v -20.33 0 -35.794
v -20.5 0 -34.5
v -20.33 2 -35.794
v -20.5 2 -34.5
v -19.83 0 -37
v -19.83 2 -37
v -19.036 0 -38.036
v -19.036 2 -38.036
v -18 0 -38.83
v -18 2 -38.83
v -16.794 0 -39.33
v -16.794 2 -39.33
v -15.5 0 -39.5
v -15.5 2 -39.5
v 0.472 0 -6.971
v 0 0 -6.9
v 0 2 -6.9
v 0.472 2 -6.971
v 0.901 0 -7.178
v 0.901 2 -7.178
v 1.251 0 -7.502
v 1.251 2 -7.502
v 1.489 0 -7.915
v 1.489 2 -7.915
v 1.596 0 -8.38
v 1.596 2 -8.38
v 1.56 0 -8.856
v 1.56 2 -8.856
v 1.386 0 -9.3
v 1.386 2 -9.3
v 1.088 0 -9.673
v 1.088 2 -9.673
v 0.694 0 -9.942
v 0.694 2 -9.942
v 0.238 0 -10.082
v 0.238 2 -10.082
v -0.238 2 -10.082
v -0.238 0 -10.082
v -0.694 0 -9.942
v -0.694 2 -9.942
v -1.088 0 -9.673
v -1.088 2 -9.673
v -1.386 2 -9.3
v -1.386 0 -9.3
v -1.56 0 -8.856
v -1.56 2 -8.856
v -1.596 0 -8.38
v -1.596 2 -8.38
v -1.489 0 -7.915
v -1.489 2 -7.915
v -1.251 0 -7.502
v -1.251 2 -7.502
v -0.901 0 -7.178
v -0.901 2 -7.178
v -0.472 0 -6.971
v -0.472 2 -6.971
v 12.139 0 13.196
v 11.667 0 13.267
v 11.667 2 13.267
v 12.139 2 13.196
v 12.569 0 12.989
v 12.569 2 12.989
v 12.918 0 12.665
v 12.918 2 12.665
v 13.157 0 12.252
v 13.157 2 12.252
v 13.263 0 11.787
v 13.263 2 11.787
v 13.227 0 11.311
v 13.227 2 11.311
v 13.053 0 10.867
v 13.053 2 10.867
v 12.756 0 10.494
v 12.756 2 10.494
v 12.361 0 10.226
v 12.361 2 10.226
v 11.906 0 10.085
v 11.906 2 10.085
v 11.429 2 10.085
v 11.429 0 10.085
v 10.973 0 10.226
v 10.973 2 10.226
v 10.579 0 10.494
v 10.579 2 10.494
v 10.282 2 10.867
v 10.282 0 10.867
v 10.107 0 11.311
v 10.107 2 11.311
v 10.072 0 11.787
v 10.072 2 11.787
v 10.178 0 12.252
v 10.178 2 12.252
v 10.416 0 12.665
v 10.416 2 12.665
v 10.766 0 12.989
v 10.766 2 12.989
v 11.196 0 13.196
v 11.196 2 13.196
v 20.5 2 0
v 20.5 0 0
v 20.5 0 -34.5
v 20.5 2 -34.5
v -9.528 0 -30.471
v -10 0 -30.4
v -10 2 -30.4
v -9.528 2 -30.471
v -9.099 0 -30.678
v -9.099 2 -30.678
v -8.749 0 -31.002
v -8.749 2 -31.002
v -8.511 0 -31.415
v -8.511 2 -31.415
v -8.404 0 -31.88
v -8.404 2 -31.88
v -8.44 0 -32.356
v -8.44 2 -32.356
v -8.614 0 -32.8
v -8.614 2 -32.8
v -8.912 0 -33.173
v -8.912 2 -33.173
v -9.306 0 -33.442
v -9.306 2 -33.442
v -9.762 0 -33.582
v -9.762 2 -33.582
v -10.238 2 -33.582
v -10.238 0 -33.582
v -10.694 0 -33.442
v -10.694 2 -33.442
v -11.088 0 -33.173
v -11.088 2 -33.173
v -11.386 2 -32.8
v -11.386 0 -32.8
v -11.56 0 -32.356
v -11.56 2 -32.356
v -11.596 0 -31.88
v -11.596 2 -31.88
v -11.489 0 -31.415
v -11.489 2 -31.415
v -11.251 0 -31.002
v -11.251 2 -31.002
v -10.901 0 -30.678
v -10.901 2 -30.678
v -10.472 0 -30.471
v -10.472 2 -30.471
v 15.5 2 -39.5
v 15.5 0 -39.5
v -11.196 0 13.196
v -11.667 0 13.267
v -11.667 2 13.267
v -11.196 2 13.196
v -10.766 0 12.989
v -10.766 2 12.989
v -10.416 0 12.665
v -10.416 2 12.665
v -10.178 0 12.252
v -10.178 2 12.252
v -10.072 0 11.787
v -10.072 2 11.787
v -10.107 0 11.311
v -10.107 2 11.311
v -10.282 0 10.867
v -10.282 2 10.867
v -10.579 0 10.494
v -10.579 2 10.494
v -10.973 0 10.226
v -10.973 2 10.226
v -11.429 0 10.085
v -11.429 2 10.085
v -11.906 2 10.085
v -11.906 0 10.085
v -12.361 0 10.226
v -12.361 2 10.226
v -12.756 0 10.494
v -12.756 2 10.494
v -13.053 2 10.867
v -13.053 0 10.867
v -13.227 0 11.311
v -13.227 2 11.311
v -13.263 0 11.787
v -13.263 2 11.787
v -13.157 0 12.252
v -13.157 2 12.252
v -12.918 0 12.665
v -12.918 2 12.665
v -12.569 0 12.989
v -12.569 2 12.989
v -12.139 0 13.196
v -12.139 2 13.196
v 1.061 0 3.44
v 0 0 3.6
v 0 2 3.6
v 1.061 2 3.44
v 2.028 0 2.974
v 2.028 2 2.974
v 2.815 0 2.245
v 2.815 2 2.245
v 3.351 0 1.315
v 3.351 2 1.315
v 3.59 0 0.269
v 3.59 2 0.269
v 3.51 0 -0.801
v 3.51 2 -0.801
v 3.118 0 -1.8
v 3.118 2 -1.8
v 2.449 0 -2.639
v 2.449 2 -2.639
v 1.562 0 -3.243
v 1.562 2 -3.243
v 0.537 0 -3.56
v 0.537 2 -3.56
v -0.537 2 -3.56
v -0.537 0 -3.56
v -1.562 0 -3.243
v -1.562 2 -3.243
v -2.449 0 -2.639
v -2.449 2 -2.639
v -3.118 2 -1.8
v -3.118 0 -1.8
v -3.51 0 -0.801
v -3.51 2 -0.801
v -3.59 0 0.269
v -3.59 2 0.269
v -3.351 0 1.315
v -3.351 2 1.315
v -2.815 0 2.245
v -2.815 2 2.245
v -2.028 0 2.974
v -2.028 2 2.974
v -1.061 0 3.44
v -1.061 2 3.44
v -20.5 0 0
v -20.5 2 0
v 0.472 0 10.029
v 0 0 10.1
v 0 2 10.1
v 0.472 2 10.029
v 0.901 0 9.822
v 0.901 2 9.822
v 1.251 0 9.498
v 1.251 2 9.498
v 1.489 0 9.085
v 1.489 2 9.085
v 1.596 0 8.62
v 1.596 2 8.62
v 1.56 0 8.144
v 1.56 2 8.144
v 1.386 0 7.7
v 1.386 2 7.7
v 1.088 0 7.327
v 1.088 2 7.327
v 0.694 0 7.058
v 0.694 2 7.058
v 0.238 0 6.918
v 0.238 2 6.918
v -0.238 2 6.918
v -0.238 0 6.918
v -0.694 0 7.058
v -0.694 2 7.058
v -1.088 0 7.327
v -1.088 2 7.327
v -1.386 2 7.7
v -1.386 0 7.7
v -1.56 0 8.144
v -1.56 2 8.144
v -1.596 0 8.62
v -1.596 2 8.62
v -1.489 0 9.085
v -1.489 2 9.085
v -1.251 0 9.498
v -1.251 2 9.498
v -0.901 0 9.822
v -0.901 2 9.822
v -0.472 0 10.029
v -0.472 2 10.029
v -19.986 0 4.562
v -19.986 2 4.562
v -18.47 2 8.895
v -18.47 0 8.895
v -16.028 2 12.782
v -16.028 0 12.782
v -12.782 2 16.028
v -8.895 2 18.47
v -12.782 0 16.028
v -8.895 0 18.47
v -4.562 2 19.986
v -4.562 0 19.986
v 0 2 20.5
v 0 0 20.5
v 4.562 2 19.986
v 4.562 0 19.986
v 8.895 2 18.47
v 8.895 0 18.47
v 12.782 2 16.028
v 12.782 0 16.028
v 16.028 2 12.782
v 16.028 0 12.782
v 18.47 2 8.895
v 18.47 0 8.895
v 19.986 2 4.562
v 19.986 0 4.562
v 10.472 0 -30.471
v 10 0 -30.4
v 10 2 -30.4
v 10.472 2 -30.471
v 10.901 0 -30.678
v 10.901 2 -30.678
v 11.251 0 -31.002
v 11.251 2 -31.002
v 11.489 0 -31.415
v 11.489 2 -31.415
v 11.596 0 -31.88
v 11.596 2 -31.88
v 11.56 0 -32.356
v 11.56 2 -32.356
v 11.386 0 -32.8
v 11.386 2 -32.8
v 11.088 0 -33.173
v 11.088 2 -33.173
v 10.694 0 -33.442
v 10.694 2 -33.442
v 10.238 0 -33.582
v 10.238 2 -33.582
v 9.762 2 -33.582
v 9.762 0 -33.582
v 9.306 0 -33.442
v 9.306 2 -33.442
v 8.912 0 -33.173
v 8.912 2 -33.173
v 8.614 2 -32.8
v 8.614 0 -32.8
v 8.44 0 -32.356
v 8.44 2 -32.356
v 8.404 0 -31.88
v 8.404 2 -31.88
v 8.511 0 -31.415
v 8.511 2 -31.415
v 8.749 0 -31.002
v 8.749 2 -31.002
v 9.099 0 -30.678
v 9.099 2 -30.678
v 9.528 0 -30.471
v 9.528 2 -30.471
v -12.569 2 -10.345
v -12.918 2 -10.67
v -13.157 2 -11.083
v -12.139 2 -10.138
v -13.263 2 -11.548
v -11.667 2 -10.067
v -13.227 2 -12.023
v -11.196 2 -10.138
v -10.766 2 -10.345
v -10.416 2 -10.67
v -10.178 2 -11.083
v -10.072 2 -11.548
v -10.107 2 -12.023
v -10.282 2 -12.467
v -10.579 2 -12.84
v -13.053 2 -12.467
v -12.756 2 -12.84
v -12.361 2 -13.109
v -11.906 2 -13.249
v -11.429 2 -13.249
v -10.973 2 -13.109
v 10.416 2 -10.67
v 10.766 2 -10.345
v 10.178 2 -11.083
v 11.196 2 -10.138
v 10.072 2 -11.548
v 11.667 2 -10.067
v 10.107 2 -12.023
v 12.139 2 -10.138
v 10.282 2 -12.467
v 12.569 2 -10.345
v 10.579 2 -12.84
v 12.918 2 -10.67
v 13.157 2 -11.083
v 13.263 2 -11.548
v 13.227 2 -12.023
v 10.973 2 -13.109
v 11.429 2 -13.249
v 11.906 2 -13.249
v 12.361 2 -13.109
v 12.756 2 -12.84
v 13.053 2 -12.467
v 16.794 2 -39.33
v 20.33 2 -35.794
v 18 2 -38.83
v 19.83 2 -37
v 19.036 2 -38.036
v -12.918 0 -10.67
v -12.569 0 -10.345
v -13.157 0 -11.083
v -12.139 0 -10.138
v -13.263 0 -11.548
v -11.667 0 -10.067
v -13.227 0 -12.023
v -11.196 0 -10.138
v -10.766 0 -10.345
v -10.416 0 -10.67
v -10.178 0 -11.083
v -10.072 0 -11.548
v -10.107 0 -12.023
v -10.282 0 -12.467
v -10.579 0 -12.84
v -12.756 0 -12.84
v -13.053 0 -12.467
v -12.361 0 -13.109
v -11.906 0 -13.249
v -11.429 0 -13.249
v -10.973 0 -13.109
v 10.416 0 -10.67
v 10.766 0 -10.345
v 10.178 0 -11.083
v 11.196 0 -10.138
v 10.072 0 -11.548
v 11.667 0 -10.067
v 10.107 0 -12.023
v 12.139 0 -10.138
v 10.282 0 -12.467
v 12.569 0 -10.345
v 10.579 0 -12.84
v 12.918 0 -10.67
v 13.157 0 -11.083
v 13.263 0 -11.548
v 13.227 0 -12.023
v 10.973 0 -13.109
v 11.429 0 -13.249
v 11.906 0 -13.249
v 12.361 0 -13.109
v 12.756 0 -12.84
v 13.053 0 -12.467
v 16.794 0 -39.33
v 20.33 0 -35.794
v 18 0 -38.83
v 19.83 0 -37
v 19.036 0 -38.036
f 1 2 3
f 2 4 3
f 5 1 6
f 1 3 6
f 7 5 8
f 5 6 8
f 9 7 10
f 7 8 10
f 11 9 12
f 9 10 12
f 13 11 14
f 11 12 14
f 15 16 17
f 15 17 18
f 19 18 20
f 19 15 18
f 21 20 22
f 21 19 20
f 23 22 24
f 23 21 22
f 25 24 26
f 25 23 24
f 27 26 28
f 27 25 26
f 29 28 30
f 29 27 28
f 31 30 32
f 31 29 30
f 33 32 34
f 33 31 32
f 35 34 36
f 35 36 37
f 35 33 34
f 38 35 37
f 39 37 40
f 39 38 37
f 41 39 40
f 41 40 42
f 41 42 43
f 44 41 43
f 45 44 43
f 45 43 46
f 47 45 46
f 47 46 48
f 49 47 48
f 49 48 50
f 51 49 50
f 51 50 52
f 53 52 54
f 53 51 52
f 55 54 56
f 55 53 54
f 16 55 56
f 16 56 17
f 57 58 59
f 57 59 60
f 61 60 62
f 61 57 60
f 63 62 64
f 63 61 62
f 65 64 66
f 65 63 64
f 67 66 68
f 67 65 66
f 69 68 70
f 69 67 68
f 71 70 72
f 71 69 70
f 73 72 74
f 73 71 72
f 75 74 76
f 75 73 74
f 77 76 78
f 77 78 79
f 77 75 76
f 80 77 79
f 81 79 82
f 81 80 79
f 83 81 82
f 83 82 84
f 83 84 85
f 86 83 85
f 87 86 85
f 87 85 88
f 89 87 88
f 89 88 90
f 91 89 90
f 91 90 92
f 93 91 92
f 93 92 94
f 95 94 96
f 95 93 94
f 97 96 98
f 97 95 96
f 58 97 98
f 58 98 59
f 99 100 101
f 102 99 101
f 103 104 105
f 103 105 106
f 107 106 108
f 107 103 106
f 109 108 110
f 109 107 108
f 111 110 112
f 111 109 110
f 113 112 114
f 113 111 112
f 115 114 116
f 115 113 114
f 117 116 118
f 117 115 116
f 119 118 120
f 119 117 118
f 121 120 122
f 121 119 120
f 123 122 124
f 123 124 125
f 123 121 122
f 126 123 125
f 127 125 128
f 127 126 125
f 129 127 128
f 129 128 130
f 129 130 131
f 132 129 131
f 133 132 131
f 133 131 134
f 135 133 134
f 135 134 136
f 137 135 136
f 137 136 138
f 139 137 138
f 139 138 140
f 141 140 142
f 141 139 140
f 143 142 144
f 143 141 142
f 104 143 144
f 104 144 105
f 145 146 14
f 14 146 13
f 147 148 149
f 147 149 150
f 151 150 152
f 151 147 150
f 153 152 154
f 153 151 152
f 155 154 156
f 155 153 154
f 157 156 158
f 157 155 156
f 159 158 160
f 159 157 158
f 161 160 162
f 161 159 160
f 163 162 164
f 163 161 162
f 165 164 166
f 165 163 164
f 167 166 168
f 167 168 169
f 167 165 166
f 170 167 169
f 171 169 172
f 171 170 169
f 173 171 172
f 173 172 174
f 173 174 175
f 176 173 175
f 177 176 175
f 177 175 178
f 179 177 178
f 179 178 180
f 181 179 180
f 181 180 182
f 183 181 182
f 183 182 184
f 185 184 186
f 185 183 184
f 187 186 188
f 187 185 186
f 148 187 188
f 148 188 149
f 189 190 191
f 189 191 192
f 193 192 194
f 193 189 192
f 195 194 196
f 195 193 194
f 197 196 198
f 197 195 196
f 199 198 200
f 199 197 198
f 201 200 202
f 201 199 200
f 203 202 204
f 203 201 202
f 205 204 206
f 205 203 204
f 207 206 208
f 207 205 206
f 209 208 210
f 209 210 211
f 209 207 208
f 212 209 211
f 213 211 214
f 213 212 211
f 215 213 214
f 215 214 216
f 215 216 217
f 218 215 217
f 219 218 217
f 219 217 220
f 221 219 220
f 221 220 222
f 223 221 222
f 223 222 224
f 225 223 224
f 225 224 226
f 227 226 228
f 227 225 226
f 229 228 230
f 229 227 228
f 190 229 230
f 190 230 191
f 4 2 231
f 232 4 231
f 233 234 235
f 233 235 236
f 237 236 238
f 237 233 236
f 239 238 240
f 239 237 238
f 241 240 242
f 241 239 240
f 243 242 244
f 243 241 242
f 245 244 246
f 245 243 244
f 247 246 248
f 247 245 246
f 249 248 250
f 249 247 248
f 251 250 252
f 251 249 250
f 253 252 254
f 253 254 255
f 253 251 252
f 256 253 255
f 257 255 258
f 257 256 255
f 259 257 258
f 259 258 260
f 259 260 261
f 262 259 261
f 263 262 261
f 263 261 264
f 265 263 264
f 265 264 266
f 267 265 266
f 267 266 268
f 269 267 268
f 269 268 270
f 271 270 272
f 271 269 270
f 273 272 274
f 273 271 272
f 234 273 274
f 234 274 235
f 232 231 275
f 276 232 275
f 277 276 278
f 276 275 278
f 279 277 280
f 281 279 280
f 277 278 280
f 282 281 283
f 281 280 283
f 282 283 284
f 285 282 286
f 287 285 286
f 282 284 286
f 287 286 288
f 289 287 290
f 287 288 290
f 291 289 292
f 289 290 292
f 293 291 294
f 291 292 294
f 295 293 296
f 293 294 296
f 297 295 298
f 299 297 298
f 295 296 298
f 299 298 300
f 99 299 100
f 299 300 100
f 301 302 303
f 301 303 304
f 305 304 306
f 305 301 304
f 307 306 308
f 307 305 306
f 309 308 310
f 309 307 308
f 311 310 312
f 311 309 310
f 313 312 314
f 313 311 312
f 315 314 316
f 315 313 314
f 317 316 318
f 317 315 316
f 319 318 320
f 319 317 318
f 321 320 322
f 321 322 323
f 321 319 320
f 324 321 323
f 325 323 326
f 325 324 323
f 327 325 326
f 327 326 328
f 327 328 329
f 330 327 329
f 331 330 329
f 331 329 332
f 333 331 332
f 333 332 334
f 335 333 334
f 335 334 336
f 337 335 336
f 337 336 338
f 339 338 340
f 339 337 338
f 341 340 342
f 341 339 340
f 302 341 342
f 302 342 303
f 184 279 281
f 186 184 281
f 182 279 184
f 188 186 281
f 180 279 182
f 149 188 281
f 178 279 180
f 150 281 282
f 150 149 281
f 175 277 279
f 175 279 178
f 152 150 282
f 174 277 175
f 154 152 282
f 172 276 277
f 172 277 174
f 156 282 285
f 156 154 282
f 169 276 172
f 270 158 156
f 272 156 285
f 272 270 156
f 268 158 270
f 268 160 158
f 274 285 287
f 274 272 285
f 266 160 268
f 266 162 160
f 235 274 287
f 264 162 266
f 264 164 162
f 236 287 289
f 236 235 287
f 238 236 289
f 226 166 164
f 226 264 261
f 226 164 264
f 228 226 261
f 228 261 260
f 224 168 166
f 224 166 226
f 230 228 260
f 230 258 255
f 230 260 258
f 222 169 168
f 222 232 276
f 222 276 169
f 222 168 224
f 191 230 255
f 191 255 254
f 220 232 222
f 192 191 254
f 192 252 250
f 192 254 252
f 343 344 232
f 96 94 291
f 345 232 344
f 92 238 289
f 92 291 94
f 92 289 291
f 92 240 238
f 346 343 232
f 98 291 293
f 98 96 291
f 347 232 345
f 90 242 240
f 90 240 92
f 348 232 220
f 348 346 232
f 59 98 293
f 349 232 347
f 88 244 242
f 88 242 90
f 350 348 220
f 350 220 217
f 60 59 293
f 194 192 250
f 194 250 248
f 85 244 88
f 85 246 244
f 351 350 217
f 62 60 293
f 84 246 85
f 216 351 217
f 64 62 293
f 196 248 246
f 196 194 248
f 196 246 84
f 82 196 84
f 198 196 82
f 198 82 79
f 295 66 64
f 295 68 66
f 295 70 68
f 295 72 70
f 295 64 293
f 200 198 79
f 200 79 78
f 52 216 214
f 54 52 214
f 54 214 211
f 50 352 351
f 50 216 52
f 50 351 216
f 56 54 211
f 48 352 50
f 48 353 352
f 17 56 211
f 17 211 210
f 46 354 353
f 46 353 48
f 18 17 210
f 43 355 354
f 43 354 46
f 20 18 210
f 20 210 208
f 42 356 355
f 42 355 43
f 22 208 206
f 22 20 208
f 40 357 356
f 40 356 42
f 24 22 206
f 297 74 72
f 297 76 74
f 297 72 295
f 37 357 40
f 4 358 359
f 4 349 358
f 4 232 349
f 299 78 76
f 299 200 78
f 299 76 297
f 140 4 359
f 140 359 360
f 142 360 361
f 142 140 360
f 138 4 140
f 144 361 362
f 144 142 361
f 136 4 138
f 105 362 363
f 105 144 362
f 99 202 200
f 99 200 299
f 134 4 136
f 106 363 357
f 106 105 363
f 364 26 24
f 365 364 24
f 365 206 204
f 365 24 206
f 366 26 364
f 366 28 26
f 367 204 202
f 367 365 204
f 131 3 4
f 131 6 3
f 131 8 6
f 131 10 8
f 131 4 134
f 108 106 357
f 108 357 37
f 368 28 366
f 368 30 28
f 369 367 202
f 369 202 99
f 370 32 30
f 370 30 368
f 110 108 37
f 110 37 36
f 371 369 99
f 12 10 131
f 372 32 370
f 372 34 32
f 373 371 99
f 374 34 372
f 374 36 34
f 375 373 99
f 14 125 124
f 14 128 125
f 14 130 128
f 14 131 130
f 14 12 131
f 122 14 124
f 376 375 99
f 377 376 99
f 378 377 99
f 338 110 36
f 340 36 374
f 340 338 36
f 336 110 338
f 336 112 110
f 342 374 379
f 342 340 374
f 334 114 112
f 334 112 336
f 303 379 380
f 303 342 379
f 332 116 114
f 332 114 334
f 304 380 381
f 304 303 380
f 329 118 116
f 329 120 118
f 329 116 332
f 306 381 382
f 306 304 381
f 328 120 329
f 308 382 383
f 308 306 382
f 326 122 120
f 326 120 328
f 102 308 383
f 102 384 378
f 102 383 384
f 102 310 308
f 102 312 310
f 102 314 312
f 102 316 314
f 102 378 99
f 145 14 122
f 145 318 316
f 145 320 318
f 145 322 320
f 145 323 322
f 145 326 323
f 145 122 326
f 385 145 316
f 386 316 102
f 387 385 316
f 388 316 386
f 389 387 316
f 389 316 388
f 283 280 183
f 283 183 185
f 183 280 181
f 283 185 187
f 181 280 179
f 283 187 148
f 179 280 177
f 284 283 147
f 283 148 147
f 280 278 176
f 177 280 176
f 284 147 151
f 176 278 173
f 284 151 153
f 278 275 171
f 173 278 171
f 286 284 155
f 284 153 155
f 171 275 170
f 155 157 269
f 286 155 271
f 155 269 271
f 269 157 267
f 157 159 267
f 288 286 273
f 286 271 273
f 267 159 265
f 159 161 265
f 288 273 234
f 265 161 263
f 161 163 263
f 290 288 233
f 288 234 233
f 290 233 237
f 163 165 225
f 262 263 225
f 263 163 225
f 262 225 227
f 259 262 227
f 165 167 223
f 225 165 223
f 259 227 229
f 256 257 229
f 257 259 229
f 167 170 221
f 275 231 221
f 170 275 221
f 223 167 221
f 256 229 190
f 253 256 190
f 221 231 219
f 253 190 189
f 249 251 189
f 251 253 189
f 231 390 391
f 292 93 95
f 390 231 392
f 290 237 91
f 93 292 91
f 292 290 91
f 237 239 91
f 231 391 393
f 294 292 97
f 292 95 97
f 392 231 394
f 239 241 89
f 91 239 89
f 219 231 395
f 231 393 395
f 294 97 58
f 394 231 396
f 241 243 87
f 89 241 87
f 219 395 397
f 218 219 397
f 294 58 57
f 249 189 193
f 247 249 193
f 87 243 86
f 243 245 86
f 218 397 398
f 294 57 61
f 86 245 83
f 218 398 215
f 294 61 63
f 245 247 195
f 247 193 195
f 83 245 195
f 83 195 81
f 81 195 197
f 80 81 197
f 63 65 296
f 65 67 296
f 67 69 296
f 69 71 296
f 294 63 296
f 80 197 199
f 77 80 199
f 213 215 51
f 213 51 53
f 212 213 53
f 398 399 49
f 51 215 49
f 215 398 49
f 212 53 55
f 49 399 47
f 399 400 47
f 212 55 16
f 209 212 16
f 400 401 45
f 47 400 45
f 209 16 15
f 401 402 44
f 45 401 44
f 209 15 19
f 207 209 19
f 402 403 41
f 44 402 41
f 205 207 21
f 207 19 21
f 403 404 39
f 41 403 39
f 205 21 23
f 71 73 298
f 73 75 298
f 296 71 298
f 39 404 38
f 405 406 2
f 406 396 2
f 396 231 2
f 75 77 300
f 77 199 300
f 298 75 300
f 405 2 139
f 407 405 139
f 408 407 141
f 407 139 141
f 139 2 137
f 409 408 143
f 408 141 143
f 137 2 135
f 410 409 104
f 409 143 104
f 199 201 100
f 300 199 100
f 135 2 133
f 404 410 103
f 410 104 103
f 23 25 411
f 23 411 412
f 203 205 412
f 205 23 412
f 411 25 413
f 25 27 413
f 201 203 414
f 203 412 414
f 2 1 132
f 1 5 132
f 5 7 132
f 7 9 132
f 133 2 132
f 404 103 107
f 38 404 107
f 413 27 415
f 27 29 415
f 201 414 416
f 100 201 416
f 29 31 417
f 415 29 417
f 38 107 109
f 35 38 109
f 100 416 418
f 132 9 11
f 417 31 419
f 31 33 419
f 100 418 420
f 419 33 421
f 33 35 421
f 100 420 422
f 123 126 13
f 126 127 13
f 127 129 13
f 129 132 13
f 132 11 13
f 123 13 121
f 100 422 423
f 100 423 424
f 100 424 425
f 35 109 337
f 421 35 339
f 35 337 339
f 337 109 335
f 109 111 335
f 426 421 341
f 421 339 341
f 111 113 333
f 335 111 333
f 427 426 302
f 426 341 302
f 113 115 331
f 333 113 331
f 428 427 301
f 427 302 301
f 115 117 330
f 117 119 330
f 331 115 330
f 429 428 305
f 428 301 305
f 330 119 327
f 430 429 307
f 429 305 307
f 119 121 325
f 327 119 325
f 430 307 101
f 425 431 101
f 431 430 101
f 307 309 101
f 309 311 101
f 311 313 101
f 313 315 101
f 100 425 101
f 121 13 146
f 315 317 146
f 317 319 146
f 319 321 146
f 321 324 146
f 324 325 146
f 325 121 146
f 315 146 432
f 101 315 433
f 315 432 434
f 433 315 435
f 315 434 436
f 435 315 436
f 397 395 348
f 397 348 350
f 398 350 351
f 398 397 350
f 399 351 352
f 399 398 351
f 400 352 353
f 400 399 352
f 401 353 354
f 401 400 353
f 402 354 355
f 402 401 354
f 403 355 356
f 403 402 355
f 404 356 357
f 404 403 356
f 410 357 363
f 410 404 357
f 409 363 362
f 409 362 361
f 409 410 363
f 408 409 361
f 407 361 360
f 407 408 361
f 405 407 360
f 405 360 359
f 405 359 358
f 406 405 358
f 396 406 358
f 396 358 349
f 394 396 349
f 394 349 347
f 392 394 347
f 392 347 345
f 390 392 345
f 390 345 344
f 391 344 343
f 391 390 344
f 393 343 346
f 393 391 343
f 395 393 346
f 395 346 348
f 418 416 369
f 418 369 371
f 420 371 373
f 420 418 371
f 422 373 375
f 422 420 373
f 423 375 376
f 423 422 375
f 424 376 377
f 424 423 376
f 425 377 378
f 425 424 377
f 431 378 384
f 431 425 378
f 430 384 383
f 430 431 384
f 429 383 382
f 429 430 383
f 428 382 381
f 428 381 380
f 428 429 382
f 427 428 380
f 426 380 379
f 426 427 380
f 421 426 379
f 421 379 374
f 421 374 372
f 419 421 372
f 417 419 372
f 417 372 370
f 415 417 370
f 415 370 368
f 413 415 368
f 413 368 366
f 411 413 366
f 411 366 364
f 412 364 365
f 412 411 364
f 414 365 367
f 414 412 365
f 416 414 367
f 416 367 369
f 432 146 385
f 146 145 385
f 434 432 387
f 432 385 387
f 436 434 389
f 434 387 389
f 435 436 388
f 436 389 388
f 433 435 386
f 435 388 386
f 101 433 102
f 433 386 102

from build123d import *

# Parameters (mm, degrees)
SKETCH_1_R      = 1.6
SKETCH_1_R_2    = 20.5
SKETCH_1_R_3    = 12.5
SKETCH_1_R_4    = 3.6
EXTRUDE_1_DEPTH = 2
FILLET_1_R      = 5


with BuildPart() as part:
    # 草图1 → 凸台-拉伸1 (new body)
    # profile 1 of 3: a face of its own
    with BuildSketch(Plane(origin=(0, 0, 0), x_dir=(1, 0, 0), z_dir=(0, 1, 0))):
        with BuildLine():
            Line((-20.5, 39.5), (-20.5, 0))
            ThreePointArc((-20.5, 0), (0, 20.5), (20.5, 0))
            Line((20.5, 0), (20.5, 39.5))
            Line((20.5, 39.5), (-20.5, 39.5))
        make_face()
        with Locations(Location((-10, 32, 0), (0, 0, 270))):
            Circle(SKETCH_1_R, mode=Mode.SUBTRACT)
        with Locations(Location((10, 32, 0), (0, 0, 270))):
            Circle(SKETCH_1_R, mode=Mode.SUBTRACT)
    # profile 2 of 3: a face of its own
    with BuildSketch(Plane(origin=(0, 0, 0), x_dir=(1, 0, 0), z_dir=(0, 1, 0))):
        Circle(SKETCH_1_R_2)
        with Locations(Location((11.66726189, -11.66726189, 0), (0, 0, 270))):
            Circle(SKETCH_1_R, mode=Mode.SUBTRACT)
        with Locations(Location((11.66726189, 11.66726189, 0), (0, 0, 270))):
            Circle(SKETCH_1_R, mode=Mode.SUBTRACT)
        with Locations(Location((-11.66726189, 11.66726189, 0), (0, 0, 270))):
            Circle(SKETCH_1_R, mode=Mode.SUBTRACT)
        with Locations(Location((-11.66726189, -11.66726189, 0), (0, 0, 270))):
            Circle(SKETCH_1_R, mode=Mode.SUBTRACT)
        Circle(SKETCH_1_R_3, mode=Mode.SUBTRACT)
    # profile 3 of 3: a face of its own
    with BuildSketch(Plane(origin=(0, 0, 0), x_dir=(1, 0, 0), z_dir=(0, 1, 0))):
        Circle(SKETCH_1_R_3)
        with Locations(Location((0, -8.5, 0), (0, 0, 270))):
            Circle(SKETCH_1_R, mode=Mode.SUBTRACT)
        with Locations(Location((0, 8.5, 0), (0, 0, 270))):
            Circle(SKETCH_1_R, mode=Mode.SUBTRACT)
        with Locations(Location((0, 0, 0), (0, 0, 270))):
            Circle(SKETCH_1_R_4, mode=Mode.SUBTRACT)
    extrude(amount=EXTRUDE_1_DEPTH)

    # 圆角1
    fillet_1_edges = [part.edges().sort_by_distance(p)[0] for p in [
        (-20.5, 1, -39.5),
        (20.5, 1, -39.5),
    ]]
    fillet(fillet_1_edges, radius=FILLET_1_R)


solid = part.part
